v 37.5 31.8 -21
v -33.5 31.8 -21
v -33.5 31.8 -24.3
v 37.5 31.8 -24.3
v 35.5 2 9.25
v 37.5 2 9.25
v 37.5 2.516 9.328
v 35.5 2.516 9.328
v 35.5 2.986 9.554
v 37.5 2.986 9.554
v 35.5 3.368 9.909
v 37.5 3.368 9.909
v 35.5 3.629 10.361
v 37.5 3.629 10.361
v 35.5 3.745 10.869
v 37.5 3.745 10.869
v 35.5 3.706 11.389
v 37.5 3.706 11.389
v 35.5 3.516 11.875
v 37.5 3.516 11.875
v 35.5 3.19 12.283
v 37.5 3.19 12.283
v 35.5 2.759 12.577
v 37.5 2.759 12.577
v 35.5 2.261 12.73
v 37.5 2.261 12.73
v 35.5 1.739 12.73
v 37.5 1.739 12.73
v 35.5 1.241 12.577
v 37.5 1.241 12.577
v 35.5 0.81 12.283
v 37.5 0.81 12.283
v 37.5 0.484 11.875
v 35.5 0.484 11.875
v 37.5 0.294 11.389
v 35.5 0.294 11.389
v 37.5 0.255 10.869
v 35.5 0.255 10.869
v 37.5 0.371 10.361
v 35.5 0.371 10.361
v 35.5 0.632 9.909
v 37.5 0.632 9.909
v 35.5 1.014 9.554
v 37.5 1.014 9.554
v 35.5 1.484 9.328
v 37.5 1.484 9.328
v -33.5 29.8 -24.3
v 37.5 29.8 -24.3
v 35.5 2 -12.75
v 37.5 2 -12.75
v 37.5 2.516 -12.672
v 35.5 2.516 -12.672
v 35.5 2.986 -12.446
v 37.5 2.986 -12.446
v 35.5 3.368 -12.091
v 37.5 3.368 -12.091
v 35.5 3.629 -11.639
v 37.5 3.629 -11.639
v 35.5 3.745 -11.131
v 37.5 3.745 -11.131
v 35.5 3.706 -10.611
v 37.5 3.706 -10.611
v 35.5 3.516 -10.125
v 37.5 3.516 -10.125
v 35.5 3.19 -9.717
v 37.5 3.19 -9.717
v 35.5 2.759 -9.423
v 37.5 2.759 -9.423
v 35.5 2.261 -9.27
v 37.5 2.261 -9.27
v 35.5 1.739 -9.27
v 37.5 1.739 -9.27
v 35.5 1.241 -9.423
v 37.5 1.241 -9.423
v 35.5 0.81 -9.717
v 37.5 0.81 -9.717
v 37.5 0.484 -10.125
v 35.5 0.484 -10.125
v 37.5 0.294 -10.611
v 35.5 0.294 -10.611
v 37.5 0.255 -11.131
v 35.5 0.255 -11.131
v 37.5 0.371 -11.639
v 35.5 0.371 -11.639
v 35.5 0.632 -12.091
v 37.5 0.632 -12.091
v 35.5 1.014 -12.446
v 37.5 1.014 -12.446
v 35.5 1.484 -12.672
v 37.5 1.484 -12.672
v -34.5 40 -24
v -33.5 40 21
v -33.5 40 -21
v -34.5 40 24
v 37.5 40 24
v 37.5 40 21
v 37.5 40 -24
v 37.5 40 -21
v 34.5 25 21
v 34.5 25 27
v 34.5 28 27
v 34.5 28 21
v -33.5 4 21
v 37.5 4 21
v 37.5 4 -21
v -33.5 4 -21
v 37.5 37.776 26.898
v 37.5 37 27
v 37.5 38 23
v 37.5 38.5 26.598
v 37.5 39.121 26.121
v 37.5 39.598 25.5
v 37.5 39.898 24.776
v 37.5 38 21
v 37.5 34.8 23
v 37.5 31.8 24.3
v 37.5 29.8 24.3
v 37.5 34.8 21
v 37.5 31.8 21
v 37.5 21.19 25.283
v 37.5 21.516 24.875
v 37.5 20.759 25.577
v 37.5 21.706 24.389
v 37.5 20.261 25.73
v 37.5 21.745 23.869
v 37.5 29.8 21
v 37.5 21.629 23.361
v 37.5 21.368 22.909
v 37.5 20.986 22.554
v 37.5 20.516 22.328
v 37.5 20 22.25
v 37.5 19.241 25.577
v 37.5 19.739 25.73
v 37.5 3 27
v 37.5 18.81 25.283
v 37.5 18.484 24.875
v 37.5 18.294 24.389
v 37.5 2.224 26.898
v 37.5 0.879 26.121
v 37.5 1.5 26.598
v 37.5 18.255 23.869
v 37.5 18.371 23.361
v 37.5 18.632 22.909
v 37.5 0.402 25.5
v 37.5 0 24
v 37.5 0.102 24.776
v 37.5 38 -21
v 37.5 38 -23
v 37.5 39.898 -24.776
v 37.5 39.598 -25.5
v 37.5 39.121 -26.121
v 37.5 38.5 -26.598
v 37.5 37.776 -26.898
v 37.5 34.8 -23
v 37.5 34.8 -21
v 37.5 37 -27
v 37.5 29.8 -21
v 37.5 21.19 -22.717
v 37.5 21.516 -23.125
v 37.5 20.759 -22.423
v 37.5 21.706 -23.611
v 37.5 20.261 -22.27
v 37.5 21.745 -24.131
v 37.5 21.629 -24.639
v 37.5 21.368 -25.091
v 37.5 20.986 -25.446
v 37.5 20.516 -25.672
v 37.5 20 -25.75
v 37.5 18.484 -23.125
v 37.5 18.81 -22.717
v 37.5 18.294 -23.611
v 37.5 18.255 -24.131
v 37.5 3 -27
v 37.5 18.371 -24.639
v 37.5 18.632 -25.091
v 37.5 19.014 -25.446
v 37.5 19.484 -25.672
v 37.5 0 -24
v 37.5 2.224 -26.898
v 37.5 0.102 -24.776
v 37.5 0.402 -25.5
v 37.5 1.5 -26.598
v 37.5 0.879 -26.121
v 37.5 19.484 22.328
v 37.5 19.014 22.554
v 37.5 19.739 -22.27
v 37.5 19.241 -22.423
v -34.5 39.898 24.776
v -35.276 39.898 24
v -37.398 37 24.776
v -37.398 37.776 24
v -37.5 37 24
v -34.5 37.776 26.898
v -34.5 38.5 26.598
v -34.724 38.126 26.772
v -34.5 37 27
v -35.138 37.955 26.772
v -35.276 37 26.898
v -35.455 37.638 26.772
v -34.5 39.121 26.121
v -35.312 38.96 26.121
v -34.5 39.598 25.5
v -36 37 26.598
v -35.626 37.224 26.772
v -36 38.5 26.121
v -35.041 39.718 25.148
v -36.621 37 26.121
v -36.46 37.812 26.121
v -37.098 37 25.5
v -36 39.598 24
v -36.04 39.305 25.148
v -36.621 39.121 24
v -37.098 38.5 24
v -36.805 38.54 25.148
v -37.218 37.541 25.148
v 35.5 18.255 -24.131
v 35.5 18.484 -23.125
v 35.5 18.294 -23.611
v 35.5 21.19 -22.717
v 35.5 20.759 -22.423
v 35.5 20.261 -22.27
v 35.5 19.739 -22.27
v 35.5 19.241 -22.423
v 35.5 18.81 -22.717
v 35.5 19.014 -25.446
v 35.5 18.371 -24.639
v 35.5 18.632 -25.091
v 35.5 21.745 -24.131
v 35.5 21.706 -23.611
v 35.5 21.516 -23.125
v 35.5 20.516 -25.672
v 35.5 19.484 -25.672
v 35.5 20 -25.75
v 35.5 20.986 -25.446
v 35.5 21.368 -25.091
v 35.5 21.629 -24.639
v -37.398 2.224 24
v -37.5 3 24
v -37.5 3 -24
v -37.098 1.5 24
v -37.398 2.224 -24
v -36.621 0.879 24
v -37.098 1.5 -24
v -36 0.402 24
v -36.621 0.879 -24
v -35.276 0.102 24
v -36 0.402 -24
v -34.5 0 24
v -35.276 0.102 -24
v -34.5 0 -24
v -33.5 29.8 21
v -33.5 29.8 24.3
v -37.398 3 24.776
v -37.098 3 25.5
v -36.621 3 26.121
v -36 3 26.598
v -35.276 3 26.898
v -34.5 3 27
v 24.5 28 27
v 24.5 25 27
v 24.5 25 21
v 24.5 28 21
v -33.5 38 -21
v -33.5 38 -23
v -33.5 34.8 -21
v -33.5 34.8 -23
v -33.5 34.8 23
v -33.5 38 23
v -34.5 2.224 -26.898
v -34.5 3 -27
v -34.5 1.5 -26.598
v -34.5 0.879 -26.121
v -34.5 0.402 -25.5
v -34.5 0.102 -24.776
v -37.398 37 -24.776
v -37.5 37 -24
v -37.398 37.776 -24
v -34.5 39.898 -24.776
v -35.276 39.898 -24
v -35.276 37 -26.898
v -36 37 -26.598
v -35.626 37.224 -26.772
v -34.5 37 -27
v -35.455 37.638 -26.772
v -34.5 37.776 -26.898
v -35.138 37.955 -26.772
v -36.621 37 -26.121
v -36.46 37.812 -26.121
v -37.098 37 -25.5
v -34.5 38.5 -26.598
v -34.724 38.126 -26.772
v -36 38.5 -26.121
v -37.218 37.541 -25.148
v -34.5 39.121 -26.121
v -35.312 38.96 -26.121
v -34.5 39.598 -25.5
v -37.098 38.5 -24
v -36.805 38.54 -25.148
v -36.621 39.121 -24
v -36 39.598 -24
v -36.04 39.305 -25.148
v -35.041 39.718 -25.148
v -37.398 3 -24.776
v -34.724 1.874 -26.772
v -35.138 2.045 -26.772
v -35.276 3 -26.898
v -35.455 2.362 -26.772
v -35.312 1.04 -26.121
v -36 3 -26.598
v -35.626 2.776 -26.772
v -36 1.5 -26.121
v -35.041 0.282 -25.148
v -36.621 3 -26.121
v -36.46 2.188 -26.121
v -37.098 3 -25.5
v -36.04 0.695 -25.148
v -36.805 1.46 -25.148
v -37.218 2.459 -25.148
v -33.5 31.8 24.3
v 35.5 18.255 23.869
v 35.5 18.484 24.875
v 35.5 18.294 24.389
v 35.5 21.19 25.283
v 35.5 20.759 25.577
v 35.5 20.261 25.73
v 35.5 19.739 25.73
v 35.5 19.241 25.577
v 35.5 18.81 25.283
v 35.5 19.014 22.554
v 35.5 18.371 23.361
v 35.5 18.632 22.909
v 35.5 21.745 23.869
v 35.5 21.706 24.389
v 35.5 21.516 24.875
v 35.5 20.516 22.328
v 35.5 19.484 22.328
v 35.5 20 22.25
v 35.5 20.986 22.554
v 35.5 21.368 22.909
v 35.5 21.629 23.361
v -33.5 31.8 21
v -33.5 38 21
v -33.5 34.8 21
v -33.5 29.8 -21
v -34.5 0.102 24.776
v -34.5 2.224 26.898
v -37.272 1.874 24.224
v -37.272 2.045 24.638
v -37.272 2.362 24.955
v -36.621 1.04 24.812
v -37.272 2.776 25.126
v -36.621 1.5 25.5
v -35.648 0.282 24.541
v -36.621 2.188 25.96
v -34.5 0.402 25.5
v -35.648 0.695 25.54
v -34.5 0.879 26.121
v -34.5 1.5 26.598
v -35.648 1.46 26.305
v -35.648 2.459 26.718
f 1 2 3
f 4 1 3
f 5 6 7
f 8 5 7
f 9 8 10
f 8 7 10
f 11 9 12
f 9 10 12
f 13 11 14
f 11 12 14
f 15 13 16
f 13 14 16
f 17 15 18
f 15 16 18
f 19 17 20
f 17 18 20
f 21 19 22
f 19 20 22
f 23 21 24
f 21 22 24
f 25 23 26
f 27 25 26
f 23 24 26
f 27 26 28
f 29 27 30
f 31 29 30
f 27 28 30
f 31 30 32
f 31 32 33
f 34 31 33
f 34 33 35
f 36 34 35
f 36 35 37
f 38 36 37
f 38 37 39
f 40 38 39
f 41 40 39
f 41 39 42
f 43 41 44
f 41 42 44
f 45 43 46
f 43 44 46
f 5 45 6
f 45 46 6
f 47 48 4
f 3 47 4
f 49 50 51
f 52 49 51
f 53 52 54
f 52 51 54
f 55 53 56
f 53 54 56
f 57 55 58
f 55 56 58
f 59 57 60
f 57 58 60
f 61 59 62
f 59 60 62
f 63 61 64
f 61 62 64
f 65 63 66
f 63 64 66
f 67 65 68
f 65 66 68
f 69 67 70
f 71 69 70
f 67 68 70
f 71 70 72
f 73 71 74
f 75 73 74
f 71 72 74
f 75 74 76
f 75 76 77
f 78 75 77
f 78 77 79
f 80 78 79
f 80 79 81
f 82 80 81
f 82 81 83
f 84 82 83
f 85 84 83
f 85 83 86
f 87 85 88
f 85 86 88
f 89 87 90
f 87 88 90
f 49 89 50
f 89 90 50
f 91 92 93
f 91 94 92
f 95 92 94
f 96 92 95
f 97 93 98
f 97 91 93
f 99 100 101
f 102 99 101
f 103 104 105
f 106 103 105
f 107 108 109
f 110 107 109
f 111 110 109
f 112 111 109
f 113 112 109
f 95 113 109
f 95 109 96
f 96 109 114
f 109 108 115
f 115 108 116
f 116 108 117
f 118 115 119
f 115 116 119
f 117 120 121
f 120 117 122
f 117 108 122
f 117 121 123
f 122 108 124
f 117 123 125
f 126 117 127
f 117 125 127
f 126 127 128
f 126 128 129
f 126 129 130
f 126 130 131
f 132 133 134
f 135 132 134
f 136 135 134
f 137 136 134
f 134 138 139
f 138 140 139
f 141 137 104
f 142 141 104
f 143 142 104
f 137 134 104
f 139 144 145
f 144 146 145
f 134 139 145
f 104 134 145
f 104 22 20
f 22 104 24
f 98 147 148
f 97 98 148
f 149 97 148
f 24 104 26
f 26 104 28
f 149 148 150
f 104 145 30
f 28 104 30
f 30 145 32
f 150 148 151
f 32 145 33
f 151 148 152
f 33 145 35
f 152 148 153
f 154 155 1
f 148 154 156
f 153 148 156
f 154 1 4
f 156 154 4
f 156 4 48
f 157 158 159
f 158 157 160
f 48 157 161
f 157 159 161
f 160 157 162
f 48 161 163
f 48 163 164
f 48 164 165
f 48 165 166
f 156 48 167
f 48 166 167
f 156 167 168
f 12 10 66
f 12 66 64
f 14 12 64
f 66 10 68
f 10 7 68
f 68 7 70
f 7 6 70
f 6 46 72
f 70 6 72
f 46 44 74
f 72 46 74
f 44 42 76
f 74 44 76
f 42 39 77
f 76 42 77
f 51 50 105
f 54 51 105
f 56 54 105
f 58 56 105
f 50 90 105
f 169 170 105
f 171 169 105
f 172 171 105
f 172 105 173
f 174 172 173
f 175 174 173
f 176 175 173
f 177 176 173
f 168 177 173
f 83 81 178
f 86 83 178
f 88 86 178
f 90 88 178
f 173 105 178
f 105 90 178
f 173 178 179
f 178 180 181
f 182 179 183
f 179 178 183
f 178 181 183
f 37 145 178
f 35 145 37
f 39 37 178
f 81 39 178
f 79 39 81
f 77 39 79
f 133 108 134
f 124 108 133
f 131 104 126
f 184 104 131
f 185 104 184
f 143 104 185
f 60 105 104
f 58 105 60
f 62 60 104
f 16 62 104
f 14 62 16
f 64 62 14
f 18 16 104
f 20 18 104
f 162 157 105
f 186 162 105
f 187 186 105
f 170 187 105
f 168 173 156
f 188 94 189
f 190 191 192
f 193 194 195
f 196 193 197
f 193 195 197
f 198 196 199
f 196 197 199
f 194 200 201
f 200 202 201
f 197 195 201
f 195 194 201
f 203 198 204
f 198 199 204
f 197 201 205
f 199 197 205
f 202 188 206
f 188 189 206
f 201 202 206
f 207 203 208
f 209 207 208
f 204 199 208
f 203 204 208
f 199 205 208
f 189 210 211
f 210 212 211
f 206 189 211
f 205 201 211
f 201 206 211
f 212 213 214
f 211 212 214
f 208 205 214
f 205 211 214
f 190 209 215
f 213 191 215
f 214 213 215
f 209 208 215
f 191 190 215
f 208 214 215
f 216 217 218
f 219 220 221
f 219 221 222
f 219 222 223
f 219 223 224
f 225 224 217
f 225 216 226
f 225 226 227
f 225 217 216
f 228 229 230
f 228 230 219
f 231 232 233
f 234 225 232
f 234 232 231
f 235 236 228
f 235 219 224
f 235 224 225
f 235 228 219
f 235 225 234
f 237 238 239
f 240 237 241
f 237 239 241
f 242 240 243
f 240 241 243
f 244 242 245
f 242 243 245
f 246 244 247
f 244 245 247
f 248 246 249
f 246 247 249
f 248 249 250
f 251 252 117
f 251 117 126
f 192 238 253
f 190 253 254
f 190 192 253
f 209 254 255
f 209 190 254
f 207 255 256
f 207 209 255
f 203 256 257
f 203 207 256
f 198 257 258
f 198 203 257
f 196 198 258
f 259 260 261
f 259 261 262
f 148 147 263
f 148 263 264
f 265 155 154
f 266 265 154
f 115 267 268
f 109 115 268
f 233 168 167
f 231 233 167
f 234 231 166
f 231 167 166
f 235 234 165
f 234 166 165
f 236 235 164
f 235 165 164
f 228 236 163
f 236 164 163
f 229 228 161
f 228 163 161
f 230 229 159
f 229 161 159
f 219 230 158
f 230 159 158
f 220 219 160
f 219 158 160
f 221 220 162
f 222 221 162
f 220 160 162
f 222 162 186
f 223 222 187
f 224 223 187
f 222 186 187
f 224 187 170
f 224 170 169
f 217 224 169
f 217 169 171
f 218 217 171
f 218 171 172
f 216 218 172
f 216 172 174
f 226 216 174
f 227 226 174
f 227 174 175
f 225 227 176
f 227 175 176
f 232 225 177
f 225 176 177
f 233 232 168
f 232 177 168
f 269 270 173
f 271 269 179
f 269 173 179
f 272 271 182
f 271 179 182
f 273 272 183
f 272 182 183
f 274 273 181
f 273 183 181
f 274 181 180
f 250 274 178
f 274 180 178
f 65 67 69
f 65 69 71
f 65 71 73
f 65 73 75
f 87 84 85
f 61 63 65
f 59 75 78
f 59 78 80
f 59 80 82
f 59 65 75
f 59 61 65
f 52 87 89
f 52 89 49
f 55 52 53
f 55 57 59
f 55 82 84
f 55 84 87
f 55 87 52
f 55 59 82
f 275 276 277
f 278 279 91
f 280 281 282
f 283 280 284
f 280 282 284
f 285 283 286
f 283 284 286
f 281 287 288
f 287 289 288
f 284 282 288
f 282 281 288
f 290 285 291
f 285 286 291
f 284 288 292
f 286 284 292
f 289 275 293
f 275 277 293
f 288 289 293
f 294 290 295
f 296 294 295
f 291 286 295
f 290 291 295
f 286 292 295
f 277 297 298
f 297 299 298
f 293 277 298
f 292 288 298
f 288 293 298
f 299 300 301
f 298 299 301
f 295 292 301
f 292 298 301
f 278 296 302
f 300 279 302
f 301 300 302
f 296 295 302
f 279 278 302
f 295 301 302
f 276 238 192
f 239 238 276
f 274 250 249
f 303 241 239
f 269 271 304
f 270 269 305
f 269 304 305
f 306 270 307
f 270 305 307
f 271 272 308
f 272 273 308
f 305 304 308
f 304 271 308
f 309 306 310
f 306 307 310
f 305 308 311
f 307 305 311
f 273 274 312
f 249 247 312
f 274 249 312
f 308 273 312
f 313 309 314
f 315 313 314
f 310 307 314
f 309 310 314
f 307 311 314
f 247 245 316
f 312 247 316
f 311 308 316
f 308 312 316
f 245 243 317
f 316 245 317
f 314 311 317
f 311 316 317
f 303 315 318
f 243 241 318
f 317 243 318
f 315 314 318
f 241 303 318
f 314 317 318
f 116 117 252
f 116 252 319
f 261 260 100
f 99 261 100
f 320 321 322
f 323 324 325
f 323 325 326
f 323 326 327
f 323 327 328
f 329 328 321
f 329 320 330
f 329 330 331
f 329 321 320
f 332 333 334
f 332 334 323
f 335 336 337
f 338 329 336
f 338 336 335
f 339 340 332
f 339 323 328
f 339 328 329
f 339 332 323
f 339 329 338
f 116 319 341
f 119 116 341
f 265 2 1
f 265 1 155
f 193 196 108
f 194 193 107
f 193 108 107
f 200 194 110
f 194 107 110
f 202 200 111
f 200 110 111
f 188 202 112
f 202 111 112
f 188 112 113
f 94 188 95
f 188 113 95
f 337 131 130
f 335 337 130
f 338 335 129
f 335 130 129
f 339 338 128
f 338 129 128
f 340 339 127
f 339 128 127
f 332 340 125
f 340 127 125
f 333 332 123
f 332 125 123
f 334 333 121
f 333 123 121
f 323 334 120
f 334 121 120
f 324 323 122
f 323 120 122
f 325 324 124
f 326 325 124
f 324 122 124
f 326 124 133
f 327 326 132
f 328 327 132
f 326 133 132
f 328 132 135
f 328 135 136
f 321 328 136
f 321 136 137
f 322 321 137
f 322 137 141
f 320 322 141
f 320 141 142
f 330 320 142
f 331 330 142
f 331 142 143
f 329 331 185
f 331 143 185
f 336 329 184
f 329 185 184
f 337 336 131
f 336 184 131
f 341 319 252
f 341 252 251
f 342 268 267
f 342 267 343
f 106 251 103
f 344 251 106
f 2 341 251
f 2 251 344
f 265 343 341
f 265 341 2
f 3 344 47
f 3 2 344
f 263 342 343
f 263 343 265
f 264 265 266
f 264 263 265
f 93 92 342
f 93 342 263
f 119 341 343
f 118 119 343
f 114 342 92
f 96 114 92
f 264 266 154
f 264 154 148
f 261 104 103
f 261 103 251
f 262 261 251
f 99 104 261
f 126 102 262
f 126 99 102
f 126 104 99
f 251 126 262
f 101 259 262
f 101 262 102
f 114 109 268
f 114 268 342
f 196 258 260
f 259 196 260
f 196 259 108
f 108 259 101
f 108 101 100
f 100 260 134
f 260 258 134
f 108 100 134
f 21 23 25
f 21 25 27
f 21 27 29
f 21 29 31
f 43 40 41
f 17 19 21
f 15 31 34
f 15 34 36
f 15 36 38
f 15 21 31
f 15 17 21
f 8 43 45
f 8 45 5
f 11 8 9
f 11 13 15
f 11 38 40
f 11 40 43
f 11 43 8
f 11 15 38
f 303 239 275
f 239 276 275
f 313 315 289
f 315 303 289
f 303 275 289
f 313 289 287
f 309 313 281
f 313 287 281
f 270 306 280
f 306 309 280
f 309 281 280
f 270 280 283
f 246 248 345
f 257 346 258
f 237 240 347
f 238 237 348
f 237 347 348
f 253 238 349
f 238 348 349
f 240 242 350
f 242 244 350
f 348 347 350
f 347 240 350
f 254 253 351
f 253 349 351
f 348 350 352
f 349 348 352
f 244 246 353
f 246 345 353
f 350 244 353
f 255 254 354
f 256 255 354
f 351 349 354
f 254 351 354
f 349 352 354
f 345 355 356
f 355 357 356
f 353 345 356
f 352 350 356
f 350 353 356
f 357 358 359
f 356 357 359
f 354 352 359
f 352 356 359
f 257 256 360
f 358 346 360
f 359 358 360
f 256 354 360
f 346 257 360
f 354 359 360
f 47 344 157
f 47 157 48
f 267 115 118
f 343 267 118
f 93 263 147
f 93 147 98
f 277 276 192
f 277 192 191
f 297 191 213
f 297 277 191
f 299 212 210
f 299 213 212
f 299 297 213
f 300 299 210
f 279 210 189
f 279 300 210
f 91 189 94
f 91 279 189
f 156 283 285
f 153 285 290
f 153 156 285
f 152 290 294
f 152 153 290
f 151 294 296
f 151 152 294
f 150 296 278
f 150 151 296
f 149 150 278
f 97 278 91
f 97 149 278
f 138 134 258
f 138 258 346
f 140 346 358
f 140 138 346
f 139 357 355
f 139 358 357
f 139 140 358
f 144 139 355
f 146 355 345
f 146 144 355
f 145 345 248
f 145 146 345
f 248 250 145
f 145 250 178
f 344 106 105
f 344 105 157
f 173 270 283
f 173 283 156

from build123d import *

# Parameters (mm, degrees)
ESQUISSE1_W             = 75
ESQUISSE1_H             = 54
BOSS_EXTRU_1_DEPTH      = 40
ESQUISSE2_W             = 42
ESQUISSE2_H             = 36.230264554
ENL_V_MAT_EXTRU_1_DEPTH = 71
ESQUISSE4_W             = 2
ESQUISSE4_H             = 3.2
ESQUISSE4_W_2           = 3.3
ESQUISSE4_H_2           = 2
ENL_V_MAT_EXTRU_2_DEPTH = 72
ESQUISSE8_W             = 10
ESQUISSE8_H             = 3
ENL_V_MAT_EXTRU_5_DEPTH = 11
ESQUISSE9_R             = 1.75
ENL_V_MAT_EXTRU_6_DEPTH = 2
CONG_1_R                = 3


with BuildPart() as part:
    # Esquisse1 → Boss.-Extru.1 (new body)
    with BuildSketch(Plane(origin=(0, 0, 0), x_dir=(1, 0, 0), z_dir=(0, 1, 0))):
        Rectangle(ESQUISSE1_W, ESQUISSE1_H)
    extrude(amount=BOSS_EXTRU_1_DEPTH)

    # Esquisse2 → Enlèv. mat.-Extru.1 (cut)
    with BuildSketch(Plane(origin=(37.5, 0, 0), x_dir=(0, 0, -1), z_dir=(1, 0, 0))):
        with Locations((0, 22.115132277)):
            Rectangle(ESQUISSE2_W, ESQUISSE2_H)
    extrude(amount=-ENL_V_MAT_EXTRU_1_DEPTH, mode=Mode.SUBTRACT)

    # Esquisse4 → Enlèv. mat.-Extru.2 (cut)
    with BuildSketch(Plane(origin=(-33.5, 0, 0), x_dir=(0, 0, -1), z_dir=(1, 0, 0))):
        with Locations((-22, 36.4)):
            Rectangle(ESQUISSE4_W, ESQUISSE4_H)
        with Locations((-22.65, 30.8)):
            Rectangle(ESQUISSE4_W_2, ESQUISSE4_H_2)
        with Locations((22, 36.4)):
            Rectangle(ESQUISSE4_W, ESQUISSE4_H)
        with Locations((22.65, 30.8)):
            Rectangle(ESQUISSE4_W_2, ESQUISSE4_H_2)
    extrude(amount=ENL_V_MAT_EXTRU_2_DEPTH, mode=Mode.SUBTRACT)

    # Esquisse8 → Enlèv. mat.-Extru.5 (cut)
    with BuildSketch(Plane.XY.offset(27)):
        with Locations((29.5, 26.5)):
            Rectangle(ESQUISSE8_W, ESQUISSE8_H)
    extrude(amount=-ENL_V_MAT_EXTRU_5_DEPTH, mode=Mode.SUBTRACT)

    # Esquisse9 → Enlèv. mat.-Extru.6 (cut)
    with BuildSketch(Plane(origin=(37.5, 0, 0), x_dir=(0, 0, -1), z_dir=(1, 0, 0))):
        with Locations((-24, 20)):
            Circle(ESQUISSE9_R)
        with Locations((-11, 2)):
            Circle(ESQUISSE9_R)
        with Locations((11, 2)):
            Circle(ESQUISSE9_R)
        with Locations((24, 20)):
            Circle(ESQUISSE9_R)
    extrude(amount=-ENL_V_MAT_EXTRU_6_DEPTH, mode=Mode.SUBTRACT)

    # Congé1
    cong_1_edges = [part.edges().sort_by_distance(p)[0] for p in [
        (-37.5, 40, 0),
        (0, 40, 27),
        (0, 0, 27),
        (-37.5, 0, 0),
        (0, 0, -27),
        (-37.5, 20, 27),
        (-37.5, 20, -27),
        (0, 40, -27),
    ]]
    fillet(cong_1_edges, radius=CONG_1_R)


solid = part.part
